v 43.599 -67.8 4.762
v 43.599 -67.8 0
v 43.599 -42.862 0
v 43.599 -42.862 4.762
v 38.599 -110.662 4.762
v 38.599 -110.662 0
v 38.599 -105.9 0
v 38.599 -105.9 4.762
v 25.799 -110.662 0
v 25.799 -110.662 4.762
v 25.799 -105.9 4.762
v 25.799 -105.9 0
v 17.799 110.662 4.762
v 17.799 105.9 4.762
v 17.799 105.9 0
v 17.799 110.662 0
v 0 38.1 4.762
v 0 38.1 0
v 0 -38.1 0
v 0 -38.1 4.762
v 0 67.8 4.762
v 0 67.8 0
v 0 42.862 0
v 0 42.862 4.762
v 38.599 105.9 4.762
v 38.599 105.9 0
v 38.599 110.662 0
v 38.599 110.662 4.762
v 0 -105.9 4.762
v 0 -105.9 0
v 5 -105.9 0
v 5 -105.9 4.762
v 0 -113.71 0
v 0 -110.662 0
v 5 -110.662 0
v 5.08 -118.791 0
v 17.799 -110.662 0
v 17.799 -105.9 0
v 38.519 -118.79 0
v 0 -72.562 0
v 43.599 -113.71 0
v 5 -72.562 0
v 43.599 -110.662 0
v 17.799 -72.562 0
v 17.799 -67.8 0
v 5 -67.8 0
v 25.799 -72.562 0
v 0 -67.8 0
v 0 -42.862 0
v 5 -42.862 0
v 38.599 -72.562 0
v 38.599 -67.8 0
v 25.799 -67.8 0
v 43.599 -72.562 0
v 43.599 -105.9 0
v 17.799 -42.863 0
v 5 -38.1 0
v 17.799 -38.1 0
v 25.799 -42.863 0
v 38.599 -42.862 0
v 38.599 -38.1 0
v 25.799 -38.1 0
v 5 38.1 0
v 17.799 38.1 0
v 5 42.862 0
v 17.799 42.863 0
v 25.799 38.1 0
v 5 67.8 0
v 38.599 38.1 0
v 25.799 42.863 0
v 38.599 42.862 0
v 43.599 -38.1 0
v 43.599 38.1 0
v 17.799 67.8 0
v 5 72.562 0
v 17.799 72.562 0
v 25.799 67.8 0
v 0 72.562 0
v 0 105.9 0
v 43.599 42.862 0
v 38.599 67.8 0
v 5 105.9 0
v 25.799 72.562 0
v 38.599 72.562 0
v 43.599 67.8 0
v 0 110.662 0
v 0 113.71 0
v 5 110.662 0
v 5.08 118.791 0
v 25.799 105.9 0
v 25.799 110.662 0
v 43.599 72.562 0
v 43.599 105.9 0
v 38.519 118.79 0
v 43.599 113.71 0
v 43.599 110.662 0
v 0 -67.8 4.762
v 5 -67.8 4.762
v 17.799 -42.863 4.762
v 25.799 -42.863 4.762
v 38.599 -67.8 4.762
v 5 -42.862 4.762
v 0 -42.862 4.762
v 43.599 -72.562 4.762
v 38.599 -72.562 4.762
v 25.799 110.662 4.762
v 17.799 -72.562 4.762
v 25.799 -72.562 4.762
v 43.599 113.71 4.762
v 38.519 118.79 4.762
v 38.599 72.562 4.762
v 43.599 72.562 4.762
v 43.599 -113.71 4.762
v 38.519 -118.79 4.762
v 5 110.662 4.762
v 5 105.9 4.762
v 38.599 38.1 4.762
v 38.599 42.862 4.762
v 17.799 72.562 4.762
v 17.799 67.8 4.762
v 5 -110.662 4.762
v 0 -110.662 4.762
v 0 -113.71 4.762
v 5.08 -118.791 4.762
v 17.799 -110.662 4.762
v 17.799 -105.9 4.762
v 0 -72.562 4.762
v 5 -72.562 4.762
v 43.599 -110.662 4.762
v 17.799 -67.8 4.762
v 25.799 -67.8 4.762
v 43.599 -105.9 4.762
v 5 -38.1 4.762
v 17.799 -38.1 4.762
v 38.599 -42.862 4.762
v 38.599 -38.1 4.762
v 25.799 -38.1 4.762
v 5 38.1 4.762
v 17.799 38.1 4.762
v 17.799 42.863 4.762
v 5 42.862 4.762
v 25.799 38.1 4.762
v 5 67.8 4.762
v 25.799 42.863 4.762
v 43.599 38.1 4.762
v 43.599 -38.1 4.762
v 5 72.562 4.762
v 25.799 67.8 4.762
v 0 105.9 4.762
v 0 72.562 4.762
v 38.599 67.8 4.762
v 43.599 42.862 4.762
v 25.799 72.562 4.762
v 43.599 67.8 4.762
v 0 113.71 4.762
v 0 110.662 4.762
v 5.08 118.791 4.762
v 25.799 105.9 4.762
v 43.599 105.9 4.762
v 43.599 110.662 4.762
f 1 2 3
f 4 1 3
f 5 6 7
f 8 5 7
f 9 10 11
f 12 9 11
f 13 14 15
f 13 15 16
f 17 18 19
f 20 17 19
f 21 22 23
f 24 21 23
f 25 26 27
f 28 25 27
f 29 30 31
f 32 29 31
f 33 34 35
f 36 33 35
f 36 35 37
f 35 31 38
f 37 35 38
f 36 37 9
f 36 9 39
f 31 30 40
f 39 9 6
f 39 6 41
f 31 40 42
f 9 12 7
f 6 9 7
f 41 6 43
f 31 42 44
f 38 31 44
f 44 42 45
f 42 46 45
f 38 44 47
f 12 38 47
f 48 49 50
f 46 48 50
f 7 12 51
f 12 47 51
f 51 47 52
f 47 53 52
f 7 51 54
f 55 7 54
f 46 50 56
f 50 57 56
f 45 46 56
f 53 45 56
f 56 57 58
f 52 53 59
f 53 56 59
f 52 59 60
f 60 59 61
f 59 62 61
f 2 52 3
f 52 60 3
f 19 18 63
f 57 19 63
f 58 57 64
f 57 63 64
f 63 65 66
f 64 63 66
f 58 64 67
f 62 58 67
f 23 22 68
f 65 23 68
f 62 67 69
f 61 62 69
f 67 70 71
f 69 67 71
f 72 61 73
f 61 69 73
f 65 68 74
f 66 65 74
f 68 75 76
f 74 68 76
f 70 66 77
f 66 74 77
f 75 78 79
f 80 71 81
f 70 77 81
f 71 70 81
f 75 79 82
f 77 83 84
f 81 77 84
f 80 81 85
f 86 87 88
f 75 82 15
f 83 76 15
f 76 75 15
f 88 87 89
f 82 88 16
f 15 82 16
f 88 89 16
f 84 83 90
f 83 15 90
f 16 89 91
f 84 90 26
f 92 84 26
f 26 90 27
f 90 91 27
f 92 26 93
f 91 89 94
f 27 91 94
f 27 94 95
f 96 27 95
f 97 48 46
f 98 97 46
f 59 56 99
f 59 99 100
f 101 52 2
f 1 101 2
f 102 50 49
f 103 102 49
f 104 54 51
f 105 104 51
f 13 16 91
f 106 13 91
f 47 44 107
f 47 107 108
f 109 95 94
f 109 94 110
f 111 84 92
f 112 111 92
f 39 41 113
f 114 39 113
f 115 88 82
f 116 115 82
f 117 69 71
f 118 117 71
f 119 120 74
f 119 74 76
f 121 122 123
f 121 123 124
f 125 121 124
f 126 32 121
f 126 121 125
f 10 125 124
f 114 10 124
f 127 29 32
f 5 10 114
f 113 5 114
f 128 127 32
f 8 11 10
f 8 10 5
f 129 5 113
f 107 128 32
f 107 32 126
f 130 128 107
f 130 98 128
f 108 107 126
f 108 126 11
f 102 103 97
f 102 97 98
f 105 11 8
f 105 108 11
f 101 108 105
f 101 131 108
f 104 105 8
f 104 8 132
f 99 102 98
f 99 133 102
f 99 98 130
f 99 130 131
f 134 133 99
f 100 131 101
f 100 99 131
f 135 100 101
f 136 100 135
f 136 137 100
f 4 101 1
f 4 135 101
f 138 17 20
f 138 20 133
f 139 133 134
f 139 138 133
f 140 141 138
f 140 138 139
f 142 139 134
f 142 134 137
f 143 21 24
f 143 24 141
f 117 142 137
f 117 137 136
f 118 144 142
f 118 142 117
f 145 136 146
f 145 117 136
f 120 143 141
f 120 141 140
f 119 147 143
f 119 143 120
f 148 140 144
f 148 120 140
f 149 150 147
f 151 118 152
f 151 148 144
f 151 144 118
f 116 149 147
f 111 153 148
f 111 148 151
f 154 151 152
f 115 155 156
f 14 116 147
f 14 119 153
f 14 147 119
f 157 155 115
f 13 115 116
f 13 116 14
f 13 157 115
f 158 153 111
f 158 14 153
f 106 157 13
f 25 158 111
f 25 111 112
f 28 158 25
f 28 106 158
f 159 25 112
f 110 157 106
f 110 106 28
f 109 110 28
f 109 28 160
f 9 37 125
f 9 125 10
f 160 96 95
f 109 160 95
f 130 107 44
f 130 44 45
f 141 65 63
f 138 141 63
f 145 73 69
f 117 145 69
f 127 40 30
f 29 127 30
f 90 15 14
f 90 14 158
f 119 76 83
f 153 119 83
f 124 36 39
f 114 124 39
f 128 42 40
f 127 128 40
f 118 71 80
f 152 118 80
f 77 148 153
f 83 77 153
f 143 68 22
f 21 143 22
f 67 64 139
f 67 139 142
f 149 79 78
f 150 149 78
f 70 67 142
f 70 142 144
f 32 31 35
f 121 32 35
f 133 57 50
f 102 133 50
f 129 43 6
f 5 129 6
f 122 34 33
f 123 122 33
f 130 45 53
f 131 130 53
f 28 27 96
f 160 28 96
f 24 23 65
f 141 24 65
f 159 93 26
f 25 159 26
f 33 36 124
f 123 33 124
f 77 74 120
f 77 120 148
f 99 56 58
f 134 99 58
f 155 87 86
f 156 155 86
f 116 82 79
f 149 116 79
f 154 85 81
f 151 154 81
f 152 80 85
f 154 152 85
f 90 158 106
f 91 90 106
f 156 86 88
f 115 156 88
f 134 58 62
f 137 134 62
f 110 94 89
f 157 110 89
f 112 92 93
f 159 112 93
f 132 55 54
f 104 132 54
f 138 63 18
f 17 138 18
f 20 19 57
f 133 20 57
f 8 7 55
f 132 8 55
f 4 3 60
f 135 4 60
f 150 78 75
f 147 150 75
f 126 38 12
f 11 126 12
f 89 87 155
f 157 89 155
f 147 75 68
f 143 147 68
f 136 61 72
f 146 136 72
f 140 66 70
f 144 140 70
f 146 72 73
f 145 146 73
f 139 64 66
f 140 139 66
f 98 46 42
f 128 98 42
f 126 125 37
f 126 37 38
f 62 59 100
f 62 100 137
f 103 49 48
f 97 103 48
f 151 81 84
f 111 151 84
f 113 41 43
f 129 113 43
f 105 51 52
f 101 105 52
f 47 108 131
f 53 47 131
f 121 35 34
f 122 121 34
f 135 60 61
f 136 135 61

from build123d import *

# Parameters (mm, degrees)
SKETCH1_W           = 8
SKETCH1_H           = 4.7625
BOSS_EXTRUDE1_DEPTH = 4.7625
CHAMFER1_SIZE       = 5.08


with BuildPart() as part:
    # Sketch1 → Boss-Extrude1 (new body)
    with BuildSketch(Plane.XY):
        Polygon((43.598645263, 118.7905), (0, 118.7905), (0, 110.6625), (5, 110.6625), (5, 105.9), (0, 105.9), (0, 72.5625), (5, 72.5625), (5, 67.8), (0, 67.8), (0, 42.8625), (5, 42.8625), (5, 38.1), (0, 38.1), (0, -38.1), (5, -38.1), (5, -42.8625), (0, -42.8625), (0, -67.8), (5, -67.8), (5, -72.5625), (0, -72.5625), (0, -105.9), (5, -105.9), (5, -110.6625), (0, -110.6625), (0, -118.7905), (43.598645263, -118.7905), (43.598645263, -110.6625), (38.598645263, -110.6625), (38.598645263, -105.9), (43.598645263, -105.9), (43.598645263, -72.5625), (38.598645263, -72.5625), (38.598645263, -67.8), (43.598645263, -67.8), (43.598645263, -42.8625), (38.598645263, -42.8625), (38.598645263, -38.1), (43.598645263, -38.1), (43.598645263, 38.1), (38.598645263, 38.1), (38.598645263, 42.8625), (43.598645263, 42.8625), (43.598645263, 67.8), (38.598645263, 67.8), (38.598645263, 72.5625), (43.598645263, 72.5625), (43.598645263, 105.9), (38.598645263, 105.9), (38.598645263, 110.6625), (43.598645263, 110.6625), align=None)
        with Locations((21.799322631, 108.28125)):
            Rectangle(SKETCH1_W, SKETCH1_H, mode=Mode.SUBTRACT)
        with Locations((21.799322631, 70.18125)):
            Rectangle(SKETCH1_W, SKETCH1_H, mode=Mode.SUBTRACT)
        with Locations((21.799322631, 40.48125)):
            Rectangle(SKETCH1_W, SKETCH1_H, mode=Mode.SUBTRACT)
        with Locations((21.799322631, -40.48125)):
            Rectangle(SKETCH1_W, SKETCH1_H, mode=Mode.SUBTRACT)
        with Locations((21.799322631, -70.18125)):
            Rectangle(SKETCH1_W, SKETCH1_H, mode=Mode.SUBTRACT)
        with Locations((21.799322631, -108.28125)):
            Rectangle(SKETCH1_W, SKETCH1_H, mode=Mode.SUBTRACT)
    extrude(amount=BOSS_EXTRUDE1_DEPTH)

    # Chamfer1
    chamfer1_edges = [part.edges().sort_by_distance(p)[0] for p in [
        (43.598645263, -118.7905, 2.38125),
        (0, -118.7905, 2.38125),
        (0, 118.7905, 2.38125),
        (43.598645263, 118.7905, 2.38125),
    ]]
    chamfer(chamfer1_edges, length=CHAMFER1_SIZE)


solid = part.part
